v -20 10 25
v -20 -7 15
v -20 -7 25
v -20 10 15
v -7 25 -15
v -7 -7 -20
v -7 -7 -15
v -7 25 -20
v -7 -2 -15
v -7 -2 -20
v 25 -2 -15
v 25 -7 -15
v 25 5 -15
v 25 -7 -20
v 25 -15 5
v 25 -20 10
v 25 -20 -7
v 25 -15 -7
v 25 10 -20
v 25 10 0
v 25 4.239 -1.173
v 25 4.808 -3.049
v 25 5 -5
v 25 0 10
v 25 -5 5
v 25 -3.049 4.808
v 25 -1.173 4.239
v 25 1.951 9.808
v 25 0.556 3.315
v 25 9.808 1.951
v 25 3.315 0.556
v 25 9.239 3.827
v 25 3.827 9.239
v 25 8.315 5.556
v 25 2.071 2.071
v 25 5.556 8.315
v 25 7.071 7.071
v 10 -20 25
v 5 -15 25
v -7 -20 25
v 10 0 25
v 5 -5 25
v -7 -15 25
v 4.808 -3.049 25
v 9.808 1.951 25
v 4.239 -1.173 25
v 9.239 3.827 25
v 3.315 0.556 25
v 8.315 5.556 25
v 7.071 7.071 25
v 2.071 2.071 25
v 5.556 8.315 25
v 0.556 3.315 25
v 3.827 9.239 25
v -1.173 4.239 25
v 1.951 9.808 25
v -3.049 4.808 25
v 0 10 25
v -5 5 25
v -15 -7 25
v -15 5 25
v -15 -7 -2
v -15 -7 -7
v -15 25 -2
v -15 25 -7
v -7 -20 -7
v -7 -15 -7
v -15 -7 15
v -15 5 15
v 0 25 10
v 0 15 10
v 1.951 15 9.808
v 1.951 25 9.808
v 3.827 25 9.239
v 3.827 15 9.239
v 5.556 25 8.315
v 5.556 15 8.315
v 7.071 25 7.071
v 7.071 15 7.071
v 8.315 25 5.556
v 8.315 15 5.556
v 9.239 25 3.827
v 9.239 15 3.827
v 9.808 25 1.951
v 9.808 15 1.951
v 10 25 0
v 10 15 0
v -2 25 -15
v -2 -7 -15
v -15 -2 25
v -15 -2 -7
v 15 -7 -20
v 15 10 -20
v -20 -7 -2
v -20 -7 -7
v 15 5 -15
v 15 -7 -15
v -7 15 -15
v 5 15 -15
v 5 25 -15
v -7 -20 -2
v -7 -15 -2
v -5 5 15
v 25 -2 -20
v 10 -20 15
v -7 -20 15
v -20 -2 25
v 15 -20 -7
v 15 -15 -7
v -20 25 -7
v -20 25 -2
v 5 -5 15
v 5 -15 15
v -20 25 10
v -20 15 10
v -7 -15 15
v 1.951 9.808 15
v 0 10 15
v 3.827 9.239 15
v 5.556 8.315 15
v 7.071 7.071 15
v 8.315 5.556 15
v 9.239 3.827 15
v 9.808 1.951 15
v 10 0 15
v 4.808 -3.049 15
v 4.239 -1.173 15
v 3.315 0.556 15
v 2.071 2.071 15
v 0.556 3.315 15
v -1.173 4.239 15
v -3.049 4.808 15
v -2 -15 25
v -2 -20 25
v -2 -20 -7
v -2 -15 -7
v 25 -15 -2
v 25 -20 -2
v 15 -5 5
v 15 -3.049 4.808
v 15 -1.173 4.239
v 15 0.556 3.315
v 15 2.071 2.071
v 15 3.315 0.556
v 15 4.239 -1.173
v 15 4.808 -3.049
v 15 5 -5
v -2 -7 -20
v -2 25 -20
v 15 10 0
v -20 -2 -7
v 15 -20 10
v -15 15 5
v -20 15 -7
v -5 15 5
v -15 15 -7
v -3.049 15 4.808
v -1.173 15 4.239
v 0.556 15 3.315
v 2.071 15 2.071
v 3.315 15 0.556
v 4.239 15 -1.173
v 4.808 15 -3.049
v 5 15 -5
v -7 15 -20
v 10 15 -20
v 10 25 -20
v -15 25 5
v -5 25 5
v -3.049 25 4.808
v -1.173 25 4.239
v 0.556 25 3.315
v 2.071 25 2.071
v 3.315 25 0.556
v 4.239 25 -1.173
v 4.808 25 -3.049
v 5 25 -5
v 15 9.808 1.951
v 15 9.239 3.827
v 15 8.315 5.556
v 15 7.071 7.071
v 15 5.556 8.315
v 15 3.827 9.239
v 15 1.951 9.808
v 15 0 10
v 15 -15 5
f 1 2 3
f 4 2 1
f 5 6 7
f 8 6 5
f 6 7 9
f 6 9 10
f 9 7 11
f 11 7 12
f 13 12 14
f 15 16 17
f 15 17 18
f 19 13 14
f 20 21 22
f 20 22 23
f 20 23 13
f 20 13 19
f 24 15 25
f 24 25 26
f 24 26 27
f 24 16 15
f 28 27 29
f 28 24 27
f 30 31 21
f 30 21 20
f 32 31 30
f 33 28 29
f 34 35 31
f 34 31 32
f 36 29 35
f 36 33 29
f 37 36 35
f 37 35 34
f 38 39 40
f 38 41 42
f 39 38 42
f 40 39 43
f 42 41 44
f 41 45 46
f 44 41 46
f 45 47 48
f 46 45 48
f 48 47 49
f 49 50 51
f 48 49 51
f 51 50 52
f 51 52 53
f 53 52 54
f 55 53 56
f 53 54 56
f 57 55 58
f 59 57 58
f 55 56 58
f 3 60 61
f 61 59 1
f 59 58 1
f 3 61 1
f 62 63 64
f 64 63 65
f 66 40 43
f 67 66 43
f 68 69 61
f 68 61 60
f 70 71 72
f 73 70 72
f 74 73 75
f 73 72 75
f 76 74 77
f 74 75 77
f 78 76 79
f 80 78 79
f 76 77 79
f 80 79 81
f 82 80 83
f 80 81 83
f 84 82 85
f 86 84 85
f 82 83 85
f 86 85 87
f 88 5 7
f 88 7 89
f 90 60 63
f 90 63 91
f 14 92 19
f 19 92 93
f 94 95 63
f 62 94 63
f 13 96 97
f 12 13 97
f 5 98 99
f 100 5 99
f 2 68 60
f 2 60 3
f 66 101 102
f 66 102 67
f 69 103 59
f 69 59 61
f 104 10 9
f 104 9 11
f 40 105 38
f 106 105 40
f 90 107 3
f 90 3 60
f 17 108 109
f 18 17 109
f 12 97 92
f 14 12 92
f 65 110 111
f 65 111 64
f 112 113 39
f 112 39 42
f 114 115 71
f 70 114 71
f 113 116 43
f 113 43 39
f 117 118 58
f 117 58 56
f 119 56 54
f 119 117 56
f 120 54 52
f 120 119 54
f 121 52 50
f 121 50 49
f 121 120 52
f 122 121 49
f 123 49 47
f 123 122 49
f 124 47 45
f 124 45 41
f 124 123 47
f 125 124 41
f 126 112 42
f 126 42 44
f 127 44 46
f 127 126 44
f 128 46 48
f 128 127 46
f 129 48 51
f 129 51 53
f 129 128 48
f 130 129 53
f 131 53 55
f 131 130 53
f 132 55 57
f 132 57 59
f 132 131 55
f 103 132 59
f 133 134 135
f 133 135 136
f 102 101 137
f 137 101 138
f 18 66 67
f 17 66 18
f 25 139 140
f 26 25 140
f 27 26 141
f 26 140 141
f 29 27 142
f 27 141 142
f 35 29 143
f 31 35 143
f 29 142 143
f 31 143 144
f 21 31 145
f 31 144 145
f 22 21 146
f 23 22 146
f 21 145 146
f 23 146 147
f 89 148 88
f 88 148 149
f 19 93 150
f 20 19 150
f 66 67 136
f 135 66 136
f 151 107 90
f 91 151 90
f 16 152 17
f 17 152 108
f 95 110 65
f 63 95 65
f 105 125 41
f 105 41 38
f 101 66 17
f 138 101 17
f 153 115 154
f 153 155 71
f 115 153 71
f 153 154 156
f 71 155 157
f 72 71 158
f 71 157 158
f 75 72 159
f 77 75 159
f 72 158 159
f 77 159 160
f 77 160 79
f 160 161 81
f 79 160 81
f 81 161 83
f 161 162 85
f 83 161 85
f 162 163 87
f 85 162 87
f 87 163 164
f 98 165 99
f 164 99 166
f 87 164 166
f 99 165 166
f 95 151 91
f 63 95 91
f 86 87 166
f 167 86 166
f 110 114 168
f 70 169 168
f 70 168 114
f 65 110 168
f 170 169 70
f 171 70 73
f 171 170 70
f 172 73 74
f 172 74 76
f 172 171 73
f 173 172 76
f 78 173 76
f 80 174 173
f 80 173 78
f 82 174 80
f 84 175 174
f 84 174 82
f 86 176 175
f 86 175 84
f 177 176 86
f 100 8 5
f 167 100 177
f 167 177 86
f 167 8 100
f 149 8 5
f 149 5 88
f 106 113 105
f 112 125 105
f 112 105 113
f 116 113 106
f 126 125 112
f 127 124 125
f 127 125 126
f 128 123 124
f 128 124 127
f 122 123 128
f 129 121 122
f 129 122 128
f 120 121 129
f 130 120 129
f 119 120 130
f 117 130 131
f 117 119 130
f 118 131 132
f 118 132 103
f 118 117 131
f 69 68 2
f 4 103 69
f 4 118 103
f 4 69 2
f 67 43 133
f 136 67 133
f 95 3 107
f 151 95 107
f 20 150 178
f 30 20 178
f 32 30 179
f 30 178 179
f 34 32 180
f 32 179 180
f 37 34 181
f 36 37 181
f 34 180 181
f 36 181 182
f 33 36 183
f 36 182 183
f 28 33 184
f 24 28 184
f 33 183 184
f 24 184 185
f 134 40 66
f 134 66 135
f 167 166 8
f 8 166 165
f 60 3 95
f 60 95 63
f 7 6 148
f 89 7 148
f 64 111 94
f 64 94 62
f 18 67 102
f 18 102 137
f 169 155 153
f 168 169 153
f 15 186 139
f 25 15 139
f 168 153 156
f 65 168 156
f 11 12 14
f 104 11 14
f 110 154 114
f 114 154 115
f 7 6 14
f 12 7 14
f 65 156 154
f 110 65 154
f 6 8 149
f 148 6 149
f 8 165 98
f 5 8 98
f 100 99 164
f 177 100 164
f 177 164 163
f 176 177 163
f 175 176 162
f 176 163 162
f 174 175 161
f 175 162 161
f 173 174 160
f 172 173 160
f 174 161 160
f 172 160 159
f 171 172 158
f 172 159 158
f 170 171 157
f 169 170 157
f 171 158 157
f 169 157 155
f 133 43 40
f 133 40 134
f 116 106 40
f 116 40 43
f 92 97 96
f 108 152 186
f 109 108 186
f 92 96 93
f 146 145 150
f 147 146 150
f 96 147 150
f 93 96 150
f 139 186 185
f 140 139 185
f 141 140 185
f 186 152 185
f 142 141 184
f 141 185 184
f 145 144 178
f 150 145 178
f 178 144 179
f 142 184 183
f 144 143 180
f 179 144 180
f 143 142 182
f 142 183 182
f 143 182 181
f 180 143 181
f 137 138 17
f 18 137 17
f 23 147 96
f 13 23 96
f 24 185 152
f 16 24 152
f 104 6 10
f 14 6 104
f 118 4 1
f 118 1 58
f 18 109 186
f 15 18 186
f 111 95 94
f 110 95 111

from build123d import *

# Parameters (mm, degrees)
BOSS_EXTRUDE1_DEPTH         = 10
BOSS_EXTRUDE2_START         = -32
SKETCH4_W                   = 5
SKETCH4_H                   = 5
BOSS_EXTRUDE2_DEPTH         = 32.000012
BOSS_EXTRUDE2_2_DEPTH       = 32.000012
BODY_MOVE_COPY2_START       = -7
BODY_MOVE_COPY2_OUTLINE_W   = 5
BODY_MOVE_COPY2_OUTLINE_H   = 32.000012
BODY_MOVE_COPY2_DEPTH       = 5
BODY_MOVE_COPY2_2_OUTLINE_W = 32.000012
BODY_MOVE_COPY2_2_OUTLINE_H = 5
BODY_MOVE_COPY2_2_DEPTH     = 5
BODY_MOVE_COPY2_START_2     = -20
BODY_MOVE_COPY2_3_OUTLINE_W = 5
BODY_MOVE_COPY2_3_OUTLINE_H = 32.000012
BODY_MOVE_COPY2_3_DEPTH     = 5
BODY_MOVE_COPY2_4_OUTLINE_W = 32.000012
BODY_MOVE_COPY2_4_OUTLINE_H = 5
BODY_MOVE_COPY2_4_DEPTH     = 5
BODY_MOVE_COPY2_START_3     = 15
BODY_MOVE_COPY2_5_DEPTH     = 10
BODY_MOVE_COPY2_6_DEPTH     = 10


# Read off the part's stored shape, not the designer's step: Body-Move/Copy2
with BuildPart() as part:
    # Sketch2 → Boss-Extrude1 (new body)
    with BuildSketch(Plane.XY.offset(15)):
        with BuildLine():
            ThreePointArc((0, 10), (7.071067812, 7.071067812), (10, 0))
            Line((10, 0), (10, -20))
            Line((10, -20), (-7, -20))
            Line((-7, -20), (-7, -15))
            Line((-7, -15), (5, -15))
            Line((5, -15), (5, -5))
            ThreePointArc((5, -5), (2.071067812, 2.071067812), (-5, 5))
            Line((-5, 5), (-15, 5))
            Line((-15, 5), (-15, -7))
            Line((-15, -7), (-20, -7))
            Line((-20, -7), (-20, 10))
            Line((-20, 10), (0, 10))
        make_face()
    extrude(amount=BOSS_EXTRUDE1_DEPTH)


with BuildPart() as body_2:
    # Sketch4 → Boss-Extrude2 (new body)
    with BuildSketch(Plane.XY.offset(25).offset(BOSS_EXTRUDE2_START)):
        with Locations((-17.5, -4.5)):
            Rectangle(SKETCH4_W, SKETCH4_H)
    extrude(amount=BOSS_EXTRUDE2_DEPTH)


with BuildPart() as body_3:
    # Sketch4 → Boss-Extrude2 2 (new body)
    with BuildSketch(Plane.XY.offset(25).offset(BOSS_EXTRUDE2_START)):
        with Locations((-4.5, -17.5)):
            Rectangle(SKETCH4_W, SKETCH4_H)
    extrude(amount=BOSS_EXTRUDE2_2_DEPTH)


with BuildPart() as body_4:
    # Body-Move/Copy2 outline → Body-Move/Copy2 (new body)
    with BuildSketch(Plane.XY.offset(BODY_MOVE_COPY2_START)):
        with Locations((-17.5, 9.000006)):
            Rectangle(BODY_MOVE_COPY2_OUTLINE_W, BODY_MOVE_COPY2_OUTLINE_H)
    extrude(amount=BODY_MOVE_COPY2_DEPTH)


with BuildPart() as body_5:
    # Body-Move_Copy2 2 outline → Body-Move_Copy2 2 (new body)
    with BuildSketch(Plane(origin=(0, 0, 0), x_dir=(1, 0, 0), z_dir=(0, 1, 0)).offset(BODY_MOVE_COPY2_START)):
        with Locations((9.000006, 17.5)):
            Rectangle(BODY_MOVE_COPY2_2_OUTLINE_W, BODY_MOVE_COPY2_2_OUTLINE_H)
    extrude(amount=BODY_MOVE_COPY2_2_DEPTH)


with BuildPart() as body_6:
    # Body-Move_Copy2 3 outline → Body-Move_Copy2 3 (new body)
    with BuildSketch(Plane.XY.offset(BODY_MOVE_COPY2_START_2)):
        with Locations((-4.5, 9.000006)):
            Rectangle(BODY_MOVE_COPY2_3_OUTLINE_W, BODY_MOVE_COPY2_3_OUTLINE_H)
    extrude(amount=BODY_MOVE_COPY2_3_DEPTH)


with BuildPart() as body_7:
    # Body-Move_Copy2 4 outline → Body-Move_Copy2 4 (new body)
    with BuildSketch(Plane(origin=(0, 0, 0), x_dir=(1, 0, 0), z_dir=(0, 1, 0)).offset(BODY_MOVE_COPY2_START_2)):
        with Locations((9.000006, 4.5)):
            Rectangle(BODY_MOVE_COPY2_4_OUTLINE_W, BODY_MOVE_COPY2_4_OUTLINE_H)
    extrude(amount=BODY_MOVE_COPY2_4_DEPTH)


with BuildPart() as body_8:
    # Body-Move_Copy2 5 outline → Body-Move_Copy2 5 (new body)
    with BuildSketch(Plane(origin=(0, 0, 0), x_dir=(1, 0, 0), z_dir=(0, 1, 0)).offset(BODY_MOVE_COPY2_START_3)):
        with BuildLine():
            ThreePointArc((0, -10), (7.071067812, -7.071067812), (10, 0))
            Line((10, 0), (10, 20))
            Line((10, 20), (-7, 20))
            Line((-7, 20), (-7, 15))
            Line((-7, 15), (5, 15))
            Line((5, 15), (5, 5))
            ThreePointArc((5, 5), (2.071067812, -2.071067812), (-5, -5))
            Line((-5, -5), (-15, -5))
            Line((-15, -5), (-15, 7))
            Line((-15, 7), (-20, 7))
            Line((-20, 7), (-20, -10))
            Line((-20, -10), (0, -10))
        make_face()
    extrude(amount=BODY_MOVE_COPY2_5_DEPTH)


with BuildPart() as body_9:
    # Body-Move_Copy2 6 outline → Body-Move_Copy2 6 (new body)
    with BuildSketch(Plane.YZ.offset(BODY_MOVE_COPY2_START_3)):
        with BuildLine():
            ThreePointArc((10, 0), (7.071067812, 7.071067812), (0, 10))
            Line((0, 10), (-20, 10))
            Line((-20, 10), (-20, -7))
            Line((-20, -7), (-15, -7))
            Line((-15, -7), (-15, 5))
            Line((-15, 5), (-5, 5))
            ThreePointArc((-5, 5), (2.071067812, 2.071067812), (5, -5))
            Line((5, -5), (5, -15))
            Line((5, -15), (-7, -15))
            Line((-7, -15), (-7, -20))
            Line((-7, -20), (10, -20))
            Line((10, -20), (10, 0))
        make_face()
    extrude(amount=BODY_MOVE_COPY2_6_DEPTH)


solid = Compound([part.part, body_2.part, body_3.part, body_4.part, body_5.part, body_6.part, body_7.part, body_8.part, body_9.part])
